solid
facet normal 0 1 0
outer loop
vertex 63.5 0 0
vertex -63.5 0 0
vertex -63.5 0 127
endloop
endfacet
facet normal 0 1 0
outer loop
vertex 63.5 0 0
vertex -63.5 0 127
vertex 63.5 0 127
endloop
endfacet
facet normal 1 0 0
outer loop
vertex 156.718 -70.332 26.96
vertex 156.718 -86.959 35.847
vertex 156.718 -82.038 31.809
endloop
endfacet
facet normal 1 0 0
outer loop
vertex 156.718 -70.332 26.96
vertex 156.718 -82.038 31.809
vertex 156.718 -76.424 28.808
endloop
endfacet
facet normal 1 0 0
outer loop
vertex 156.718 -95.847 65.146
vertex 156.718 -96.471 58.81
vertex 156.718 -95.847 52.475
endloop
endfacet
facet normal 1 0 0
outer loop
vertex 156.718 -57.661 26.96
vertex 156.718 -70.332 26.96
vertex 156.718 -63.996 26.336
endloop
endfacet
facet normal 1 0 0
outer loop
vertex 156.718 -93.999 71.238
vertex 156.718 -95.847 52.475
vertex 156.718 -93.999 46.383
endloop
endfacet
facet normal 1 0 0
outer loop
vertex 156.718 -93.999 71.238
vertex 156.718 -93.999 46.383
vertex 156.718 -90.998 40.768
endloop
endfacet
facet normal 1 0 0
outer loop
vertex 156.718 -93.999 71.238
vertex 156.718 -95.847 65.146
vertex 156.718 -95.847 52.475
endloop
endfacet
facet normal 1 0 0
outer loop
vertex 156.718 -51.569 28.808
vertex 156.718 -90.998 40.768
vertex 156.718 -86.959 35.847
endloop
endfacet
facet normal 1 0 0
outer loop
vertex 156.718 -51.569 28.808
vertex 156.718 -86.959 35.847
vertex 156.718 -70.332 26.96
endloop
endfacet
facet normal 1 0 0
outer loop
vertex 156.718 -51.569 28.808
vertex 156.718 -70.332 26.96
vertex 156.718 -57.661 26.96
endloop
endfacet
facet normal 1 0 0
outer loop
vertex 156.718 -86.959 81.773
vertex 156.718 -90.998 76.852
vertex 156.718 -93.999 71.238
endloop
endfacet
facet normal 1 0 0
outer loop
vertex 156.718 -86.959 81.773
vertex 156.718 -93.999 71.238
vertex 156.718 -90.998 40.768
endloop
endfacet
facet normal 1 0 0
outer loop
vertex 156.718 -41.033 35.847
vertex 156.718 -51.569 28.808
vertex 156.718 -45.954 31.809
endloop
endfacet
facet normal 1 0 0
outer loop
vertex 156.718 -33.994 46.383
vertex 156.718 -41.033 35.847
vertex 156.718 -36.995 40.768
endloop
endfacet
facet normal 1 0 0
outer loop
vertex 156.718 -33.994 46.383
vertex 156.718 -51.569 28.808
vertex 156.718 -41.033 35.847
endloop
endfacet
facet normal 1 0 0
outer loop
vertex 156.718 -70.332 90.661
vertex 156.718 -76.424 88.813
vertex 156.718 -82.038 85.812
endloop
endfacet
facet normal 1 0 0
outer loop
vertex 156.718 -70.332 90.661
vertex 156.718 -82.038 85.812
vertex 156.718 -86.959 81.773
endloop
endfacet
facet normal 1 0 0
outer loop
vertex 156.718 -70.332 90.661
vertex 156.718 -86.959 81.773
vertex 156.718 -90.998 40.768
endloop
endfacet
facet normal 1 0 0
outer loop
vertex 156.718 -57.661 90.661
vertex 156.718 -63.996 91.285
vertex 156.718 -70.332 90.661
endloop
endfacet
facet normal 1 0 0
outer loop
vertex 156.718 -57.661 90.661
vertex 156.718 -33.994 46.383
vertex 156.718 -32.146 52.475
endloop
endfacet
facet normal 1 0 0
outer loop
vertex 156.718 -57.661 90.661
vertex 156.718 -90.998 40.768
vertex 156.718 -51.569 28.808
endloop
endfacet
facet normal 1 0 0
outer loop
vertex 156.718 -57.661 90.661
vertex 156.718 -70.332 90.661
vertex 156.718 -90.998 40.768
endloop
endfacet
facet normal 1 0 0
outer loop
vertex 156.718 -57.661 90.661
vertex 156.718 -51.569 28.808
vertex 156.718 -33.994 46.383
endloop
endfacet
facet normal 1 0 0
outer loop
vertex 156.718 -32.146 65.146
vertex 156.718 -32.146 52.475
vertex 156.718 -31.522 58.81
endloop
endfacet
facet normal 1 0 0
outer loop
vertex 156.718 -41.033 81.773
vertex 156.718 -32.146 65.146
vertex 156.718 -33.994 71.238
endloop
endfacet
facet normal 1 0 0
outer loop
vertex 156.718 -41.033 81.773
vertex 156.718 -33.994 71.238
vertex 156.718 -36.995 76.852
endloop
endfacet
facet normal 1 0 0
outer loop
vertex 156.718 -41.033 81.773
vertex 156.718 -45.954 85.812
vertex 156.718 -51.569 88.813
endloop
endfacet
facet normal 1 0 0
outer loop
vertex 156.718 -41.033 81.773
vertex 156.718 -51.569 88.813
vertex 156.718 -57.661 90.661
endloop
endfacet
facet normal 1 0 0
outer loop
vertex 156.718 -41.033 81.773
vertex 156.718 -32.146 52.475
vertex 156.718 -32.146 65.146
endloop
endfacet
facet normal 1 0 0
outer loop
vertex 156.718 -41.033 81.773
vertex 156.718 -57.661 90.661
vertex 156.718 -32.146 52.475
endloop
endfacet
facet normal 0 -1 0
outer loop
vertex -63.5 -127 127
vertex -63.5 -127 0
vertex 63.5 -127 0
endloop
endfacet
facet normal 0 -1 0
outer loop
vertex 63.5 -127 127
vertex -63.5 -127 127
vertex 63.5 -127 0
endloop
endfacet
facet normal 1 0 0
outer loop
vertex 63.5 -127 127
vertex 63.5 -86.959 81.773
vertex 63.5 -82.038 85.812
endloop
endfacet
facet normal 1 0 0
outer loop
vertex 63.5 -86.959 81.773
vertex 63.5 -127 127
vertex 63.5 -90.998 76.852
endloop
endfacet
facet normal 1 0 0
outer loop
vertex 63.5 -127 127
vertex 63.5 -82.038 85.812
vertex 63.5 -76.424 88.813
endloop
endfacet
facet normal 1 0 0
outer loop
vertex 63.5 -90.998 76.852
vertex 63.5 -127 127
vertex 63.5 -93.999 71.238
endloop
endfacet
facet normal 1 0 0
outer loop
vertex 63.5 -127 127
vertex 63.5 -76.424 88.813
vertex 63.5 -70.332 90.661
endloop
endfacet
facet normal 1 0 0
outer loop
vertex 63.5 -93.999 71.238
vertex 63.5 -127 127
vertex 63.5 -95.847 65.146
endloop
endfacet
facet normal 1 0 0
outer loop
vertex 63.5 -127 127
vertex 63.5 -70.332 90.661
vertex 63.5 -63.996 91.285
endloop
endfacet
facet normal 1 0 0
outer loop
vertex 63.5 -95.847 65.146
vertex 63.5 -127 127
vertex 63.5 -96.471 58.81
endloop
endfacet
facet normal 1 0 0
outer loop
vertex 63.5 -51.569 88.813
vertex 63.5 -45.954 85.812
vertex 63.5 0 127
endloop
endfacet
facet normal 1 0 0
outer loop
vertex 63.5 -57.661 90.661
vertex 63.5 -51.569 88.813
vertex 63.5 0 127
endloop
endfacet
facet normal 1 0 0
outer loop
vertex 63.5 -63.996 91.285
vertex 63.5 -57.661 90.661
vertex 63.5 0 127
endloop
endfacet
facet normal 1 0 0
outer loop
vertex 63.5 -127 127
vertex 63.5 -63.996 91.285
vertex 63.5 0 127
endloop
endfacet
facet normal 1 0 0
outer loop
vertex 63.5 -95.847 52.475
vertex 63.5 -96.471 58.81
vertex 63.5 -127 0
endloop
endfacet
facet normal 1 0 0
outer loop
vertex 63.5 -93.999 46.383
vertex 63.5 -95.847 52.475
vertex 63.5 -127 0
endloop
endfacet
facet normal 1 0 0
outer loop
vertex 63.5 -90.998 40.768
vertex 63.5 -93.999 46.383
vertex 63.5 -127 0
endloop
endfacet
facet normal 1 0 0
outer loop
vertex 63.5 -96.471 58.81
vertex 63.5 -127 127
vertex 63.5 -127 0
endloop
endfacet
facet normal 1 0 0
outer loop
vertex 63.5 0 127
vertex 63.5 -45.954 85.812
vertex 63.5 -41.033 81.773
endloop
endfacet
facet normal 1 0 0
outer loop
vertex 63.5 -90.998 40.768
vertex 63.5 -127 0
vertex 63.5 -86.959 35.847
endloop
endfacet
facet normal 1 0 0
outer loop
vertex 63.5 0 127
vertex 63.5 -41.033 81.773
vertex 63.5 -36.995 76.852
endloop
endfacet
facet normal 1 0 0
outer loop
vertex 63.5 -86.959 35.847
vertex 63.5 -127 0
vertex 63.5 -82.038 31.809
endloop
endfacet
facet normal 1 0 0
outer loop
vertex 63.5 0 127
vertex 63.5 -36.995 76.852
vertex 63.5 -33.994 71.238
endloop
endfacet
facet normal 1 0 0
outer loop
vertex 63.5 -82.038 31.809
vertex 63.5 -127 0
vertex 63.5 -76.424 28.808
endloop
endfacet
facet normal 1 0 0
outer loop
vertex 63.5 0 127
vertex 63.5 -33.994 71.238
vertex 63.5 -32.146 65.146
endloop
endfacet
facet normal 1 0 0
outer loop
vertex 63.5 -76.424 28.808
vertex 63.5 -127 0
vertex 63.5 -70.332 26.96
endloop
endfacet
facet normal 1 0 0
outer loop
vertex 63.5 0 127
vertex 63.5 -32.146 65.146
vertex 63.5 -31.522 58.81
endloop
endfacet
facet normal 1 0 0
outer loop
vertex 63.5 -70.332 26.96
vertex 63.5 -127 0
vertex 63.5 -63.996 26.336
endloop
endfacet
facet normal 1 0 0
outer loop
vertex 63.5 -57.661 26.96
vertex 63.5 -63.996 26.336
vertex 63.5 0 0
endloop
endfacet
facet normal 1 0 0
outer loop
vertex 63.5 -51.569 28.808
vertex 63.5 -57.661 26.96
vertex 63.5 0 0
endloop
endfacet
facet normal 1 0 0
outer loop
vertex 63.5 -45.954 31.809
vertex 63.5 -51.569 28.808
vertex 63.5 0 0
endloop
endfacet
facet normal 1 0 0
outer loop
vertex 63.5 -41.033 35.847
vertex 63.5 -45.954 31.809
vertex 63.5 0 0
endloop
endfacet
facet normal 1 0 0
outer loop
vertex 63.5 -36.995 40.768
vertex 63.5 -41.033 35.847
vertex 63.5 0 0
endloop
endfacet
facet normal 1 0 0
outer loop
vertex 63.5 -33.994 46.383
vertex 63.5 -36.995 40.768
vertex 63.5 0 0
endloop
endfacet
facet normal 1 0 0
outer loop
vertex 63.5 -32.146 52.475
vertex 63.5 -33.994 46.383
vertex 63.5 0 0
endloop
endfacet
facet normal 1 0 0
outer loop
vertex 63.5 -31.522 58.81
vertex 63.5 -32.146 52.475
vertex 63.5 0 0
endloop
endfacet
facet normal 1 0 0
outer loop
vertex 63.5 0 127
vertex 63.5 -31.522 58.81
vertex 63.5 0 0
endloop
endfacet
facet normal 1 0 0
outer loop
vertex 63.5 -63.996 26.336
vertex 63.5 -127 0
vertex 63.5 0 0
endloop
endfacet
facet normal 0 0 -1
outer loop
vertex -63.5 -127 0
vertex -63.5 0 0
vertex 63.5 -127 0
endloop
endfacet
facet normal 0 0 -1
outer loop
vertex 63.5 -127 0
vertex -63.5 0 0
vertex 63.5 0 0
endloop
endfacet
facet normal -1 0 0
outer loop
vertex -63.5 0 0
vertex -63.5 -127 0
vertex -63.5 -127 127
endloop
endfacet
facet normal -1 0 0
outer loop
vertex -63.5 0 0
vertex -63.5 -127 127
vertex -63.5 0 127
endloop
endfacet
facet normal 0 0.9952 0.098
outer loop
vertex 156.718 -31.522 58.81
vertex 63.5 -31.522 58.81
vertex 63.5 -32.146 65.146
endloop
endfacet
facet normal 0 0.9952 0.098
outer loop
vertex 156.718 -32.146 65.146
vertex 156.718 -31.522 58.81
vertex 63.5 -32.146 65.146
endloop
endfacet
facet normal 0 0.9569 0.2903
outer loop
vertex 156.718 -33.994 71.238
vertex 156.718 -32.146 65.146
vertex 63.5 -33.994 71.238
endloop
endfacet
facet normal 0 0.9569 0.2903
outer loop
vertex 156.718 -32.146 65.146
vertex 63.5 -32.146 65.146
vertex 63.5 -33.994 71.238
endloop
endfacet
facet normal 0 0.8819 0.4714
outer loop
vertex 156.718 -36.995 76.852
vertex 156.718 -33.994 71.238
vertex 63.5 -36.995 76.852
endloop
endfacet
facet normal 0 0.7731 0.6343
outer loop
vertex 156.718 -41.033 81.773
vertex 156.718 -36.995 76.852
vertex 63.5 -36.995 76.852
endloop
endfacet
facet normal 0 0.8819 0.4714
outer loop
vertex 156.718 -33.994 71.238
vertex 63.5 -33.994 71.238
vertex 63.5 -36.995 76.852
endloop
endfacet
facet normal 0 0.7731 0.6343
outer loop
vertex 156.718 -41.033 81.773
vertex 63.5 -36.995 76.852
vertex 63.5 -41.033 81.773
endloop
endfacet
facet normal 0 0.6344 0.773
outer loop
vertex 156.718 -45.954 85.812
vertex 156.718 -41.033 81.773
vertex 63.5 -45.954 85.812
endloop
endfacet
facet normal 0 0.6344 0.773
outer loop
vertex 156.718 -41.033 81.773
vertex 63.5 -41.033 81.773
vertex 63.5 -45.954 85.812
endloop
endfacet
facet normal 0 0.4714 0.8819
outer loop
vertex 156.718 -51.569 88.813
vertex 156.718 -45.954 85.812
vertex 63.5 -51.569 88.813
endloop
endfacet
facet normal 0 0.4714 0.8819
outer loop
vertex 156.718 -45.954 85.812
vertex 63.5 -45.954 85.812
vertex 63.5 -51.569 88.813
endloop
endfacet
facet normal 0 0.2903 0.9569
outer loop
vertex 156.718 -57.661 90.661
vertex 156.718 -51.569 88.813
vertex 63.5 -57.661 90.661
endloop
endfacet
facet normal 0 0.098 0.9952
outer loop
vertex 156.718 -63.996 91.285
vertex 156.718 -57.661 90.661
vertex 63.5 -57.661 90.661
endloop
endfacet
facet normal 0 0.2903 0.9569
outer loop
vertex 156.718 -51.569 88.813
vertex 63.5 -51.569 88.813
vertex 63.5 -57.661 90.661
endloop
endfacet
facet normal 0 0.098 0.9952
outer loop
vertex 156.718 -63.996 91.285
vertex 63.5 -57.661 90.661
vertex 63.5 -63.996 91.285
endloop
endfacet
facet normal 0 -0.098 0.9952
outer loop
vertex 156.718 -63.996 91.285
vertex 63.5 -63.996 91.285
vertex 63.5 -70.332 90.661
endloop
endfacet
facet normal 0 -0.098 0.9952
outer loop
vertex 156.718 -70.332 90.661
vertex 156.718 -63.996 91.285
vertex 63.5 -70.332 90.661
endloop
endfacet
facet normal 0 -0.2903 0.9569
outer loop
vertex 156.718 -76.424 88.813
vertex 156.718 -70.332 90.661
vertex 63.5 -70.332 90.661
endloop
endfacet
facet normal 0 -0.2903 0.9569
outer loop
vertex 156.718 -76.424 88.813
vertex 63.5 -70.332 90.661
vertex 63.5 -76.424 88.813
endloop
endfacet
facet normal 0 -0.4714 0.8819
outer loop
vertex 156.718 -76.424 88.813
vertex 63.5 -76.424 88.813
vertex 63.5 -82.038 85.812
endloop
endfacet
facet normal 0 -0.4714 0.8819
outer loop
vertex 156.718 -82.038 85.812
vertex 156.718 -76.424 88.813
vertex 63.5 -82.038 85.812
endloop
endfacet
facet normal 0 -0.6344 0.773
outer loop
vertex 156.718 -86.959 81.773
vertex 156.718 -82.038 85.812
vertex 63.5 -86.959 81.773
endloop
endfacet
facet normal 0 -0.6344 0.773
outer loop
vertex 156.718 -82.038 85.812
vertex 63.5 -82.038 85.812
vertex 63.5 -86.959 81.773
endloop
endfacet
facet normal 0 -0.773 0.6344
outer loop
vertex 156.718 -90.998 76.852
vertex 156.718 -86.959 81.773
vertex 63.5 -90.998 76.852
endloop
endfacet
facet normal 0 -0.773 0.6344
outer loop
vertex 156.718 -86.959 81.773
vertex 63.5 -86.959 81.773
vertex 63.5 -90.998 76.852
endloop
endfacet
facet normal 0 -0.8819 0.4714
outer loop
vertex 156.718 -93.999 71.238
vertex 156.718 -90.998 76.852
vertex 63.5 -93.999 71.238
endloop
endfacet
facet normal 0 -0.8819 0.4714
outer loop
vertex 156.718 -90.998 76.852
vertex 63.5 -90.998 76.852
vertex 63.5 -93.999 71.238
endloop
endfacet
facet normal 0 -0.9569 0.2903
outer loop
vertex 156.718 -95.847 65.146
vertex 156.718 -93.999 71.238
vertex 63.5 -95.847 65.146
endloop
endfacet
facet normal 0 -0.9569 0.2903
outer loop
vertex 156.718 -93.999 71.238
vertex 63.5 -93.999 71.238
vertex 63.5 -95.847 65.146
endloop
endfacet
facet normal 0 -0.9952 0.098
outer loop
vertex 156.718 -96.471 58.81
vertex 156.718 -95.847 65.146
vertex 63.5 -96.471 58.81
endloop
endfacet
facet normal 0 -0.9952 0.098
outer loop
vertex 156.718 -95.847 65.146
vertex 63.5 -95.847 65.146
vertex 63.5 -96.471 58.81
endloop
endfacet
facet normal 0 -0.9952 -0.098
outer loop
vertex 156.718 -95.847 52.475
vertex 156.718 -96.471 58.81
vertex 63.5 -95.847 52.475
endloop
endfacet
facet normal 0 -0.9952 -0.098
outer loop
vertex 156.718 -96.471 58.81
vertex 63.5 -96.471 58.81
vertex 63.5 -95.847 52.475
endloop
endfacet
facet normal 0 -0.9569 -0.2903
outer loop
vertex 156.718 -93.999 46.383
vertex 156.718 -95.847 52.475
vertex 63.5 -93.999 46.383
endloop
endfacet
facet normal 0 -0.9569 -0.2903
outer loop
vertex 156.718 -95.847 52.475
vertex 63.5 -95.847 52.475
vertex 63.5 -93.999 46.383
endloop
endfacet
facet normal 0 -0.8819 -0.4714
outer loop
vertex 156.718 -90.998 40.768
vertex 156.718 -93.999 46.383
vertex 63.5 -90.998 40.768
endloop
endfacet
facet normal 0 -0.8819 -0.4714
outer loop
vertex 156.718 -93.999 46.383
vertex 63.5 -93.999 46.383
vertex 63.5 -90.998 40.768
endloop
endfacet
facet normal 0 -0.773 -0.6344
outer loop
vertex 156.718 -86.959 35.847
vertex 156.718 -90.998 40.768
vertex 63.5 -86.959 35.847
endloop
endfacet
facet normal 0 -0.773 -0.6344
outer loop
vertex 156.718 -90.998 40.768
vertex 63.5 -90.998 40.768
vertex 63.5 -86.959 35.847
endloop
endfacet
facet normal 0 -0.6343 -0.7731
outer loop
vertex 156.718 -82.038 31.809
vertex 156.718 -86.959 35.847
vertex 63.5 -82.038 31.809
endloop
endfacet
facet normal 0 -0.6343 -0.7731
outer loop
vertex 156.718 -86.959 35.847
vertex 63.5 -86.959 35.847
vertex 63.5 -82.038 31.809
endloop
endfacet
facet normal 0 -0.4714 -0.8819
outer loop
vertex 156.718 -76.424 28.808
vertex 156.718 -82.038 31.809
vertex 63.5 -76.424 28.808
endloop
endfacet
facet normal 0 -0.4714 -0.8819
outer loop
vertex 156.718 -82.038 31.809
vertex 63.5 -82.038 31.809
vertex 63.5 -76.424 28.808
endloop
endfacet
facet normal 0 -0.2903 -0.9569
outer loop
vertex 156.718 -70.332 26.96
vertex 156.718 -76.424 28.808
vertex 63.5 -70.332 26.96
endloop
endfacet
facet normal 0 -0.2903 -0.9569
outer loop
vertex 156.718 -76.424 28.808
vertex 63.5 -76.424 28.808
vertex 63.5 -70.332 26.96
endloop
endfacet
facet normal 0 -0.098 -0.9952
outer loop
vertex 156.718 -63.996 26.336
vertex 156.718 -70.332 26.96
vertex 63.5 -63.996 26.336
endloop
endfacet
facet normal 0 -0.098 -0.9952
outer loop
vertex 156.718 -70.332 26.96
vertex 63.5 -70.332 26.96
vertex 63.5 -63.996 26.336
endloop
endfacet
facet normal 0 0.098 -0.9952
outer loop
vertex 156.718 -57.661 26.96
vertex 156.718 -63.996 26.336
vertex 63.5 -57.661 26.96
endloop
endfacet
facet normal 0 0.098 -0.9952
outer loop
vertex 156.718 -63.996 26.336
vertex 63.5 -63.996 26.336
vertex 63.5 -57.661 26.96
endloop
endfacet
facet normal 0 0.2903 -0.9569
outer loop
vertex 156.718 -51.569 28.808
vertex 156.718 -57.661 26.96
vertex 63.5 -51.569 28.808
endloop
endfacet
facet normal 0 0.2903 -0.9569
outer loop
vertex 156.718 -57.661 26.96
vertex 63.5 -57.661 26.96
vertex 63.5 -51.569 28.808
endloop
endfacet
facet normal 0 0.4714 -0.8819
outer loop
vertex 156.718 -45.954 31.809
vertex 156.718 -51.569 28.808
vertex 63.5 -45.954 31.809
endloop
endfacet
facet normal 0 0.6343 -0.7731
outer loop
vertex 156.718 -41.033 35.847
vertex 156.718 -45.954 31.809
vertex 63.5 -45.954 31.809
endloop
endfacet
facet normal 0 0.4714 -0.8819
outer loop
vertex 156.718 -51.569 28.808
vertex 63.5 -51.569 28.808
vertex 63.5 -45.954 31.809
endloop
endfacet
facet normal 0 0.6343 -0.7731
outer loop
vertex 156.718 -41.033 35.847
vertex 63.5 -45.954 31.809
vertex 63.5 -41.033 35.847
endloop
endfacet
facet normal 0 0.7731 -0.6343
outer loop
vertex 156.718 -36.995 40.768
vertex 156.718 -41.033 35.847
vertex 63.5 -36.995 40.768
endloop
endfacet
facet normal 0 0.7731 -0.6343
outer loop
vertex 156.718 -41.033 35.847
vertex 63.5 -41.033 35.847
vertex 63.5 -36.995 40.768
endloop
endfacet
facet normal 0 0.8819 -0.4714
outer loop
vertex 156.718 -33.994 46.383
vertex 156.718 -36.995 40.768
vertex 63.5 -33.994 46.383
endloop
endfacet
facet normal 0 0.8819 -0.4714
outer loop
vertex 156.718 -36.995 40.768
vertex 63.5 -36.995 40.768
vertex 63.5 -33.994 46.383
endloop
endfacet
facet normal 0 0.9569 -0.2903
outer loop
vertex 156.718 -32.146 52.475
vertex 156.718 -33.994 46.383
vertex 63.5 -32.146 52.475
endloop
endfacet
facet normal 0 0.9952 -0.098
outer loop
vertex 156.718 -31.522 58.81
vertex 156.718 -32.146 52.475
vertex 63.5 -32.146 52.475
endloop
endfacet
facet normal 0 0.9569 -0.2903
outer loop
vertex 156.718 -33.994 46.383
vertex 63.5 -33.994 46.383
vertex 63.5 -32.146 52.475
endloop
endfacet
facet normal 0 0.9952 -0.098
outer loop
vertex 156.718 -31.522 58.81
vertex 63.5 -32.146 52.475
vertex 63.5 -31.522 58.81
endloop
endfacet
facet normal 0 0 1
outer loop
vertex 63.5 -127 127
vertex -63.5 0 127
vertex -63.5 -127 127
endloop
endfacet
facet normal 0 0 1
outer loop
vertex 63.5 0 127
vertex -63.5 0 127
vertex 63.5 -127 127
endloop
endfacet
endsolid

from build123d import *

# Parameters (mm, degrees)
F0_W     = 127
F0_H     = 127
F1_DEPTH = 127
F2_R     = 32.47457
F3_DEPTH = 93.218


with BuildPart() as f1:
    # F0 (on Top) → F1 (new body)
    with BuildSketch(Plane.XY):
        with Locations((0, -63.5)):
            Rectangle(F0_W, F0_H)
    extrude(amount=F1_DEPTH)

    # F2 (on face) → F3 (join)
    with BuildSketch(Plane.YZ.offset(63.5)):
        with Locations((-63.9963, 58.810309)):
            Circle(F2_R)
    extrude(amount=F3_DEPTH)


solid = f1.part
